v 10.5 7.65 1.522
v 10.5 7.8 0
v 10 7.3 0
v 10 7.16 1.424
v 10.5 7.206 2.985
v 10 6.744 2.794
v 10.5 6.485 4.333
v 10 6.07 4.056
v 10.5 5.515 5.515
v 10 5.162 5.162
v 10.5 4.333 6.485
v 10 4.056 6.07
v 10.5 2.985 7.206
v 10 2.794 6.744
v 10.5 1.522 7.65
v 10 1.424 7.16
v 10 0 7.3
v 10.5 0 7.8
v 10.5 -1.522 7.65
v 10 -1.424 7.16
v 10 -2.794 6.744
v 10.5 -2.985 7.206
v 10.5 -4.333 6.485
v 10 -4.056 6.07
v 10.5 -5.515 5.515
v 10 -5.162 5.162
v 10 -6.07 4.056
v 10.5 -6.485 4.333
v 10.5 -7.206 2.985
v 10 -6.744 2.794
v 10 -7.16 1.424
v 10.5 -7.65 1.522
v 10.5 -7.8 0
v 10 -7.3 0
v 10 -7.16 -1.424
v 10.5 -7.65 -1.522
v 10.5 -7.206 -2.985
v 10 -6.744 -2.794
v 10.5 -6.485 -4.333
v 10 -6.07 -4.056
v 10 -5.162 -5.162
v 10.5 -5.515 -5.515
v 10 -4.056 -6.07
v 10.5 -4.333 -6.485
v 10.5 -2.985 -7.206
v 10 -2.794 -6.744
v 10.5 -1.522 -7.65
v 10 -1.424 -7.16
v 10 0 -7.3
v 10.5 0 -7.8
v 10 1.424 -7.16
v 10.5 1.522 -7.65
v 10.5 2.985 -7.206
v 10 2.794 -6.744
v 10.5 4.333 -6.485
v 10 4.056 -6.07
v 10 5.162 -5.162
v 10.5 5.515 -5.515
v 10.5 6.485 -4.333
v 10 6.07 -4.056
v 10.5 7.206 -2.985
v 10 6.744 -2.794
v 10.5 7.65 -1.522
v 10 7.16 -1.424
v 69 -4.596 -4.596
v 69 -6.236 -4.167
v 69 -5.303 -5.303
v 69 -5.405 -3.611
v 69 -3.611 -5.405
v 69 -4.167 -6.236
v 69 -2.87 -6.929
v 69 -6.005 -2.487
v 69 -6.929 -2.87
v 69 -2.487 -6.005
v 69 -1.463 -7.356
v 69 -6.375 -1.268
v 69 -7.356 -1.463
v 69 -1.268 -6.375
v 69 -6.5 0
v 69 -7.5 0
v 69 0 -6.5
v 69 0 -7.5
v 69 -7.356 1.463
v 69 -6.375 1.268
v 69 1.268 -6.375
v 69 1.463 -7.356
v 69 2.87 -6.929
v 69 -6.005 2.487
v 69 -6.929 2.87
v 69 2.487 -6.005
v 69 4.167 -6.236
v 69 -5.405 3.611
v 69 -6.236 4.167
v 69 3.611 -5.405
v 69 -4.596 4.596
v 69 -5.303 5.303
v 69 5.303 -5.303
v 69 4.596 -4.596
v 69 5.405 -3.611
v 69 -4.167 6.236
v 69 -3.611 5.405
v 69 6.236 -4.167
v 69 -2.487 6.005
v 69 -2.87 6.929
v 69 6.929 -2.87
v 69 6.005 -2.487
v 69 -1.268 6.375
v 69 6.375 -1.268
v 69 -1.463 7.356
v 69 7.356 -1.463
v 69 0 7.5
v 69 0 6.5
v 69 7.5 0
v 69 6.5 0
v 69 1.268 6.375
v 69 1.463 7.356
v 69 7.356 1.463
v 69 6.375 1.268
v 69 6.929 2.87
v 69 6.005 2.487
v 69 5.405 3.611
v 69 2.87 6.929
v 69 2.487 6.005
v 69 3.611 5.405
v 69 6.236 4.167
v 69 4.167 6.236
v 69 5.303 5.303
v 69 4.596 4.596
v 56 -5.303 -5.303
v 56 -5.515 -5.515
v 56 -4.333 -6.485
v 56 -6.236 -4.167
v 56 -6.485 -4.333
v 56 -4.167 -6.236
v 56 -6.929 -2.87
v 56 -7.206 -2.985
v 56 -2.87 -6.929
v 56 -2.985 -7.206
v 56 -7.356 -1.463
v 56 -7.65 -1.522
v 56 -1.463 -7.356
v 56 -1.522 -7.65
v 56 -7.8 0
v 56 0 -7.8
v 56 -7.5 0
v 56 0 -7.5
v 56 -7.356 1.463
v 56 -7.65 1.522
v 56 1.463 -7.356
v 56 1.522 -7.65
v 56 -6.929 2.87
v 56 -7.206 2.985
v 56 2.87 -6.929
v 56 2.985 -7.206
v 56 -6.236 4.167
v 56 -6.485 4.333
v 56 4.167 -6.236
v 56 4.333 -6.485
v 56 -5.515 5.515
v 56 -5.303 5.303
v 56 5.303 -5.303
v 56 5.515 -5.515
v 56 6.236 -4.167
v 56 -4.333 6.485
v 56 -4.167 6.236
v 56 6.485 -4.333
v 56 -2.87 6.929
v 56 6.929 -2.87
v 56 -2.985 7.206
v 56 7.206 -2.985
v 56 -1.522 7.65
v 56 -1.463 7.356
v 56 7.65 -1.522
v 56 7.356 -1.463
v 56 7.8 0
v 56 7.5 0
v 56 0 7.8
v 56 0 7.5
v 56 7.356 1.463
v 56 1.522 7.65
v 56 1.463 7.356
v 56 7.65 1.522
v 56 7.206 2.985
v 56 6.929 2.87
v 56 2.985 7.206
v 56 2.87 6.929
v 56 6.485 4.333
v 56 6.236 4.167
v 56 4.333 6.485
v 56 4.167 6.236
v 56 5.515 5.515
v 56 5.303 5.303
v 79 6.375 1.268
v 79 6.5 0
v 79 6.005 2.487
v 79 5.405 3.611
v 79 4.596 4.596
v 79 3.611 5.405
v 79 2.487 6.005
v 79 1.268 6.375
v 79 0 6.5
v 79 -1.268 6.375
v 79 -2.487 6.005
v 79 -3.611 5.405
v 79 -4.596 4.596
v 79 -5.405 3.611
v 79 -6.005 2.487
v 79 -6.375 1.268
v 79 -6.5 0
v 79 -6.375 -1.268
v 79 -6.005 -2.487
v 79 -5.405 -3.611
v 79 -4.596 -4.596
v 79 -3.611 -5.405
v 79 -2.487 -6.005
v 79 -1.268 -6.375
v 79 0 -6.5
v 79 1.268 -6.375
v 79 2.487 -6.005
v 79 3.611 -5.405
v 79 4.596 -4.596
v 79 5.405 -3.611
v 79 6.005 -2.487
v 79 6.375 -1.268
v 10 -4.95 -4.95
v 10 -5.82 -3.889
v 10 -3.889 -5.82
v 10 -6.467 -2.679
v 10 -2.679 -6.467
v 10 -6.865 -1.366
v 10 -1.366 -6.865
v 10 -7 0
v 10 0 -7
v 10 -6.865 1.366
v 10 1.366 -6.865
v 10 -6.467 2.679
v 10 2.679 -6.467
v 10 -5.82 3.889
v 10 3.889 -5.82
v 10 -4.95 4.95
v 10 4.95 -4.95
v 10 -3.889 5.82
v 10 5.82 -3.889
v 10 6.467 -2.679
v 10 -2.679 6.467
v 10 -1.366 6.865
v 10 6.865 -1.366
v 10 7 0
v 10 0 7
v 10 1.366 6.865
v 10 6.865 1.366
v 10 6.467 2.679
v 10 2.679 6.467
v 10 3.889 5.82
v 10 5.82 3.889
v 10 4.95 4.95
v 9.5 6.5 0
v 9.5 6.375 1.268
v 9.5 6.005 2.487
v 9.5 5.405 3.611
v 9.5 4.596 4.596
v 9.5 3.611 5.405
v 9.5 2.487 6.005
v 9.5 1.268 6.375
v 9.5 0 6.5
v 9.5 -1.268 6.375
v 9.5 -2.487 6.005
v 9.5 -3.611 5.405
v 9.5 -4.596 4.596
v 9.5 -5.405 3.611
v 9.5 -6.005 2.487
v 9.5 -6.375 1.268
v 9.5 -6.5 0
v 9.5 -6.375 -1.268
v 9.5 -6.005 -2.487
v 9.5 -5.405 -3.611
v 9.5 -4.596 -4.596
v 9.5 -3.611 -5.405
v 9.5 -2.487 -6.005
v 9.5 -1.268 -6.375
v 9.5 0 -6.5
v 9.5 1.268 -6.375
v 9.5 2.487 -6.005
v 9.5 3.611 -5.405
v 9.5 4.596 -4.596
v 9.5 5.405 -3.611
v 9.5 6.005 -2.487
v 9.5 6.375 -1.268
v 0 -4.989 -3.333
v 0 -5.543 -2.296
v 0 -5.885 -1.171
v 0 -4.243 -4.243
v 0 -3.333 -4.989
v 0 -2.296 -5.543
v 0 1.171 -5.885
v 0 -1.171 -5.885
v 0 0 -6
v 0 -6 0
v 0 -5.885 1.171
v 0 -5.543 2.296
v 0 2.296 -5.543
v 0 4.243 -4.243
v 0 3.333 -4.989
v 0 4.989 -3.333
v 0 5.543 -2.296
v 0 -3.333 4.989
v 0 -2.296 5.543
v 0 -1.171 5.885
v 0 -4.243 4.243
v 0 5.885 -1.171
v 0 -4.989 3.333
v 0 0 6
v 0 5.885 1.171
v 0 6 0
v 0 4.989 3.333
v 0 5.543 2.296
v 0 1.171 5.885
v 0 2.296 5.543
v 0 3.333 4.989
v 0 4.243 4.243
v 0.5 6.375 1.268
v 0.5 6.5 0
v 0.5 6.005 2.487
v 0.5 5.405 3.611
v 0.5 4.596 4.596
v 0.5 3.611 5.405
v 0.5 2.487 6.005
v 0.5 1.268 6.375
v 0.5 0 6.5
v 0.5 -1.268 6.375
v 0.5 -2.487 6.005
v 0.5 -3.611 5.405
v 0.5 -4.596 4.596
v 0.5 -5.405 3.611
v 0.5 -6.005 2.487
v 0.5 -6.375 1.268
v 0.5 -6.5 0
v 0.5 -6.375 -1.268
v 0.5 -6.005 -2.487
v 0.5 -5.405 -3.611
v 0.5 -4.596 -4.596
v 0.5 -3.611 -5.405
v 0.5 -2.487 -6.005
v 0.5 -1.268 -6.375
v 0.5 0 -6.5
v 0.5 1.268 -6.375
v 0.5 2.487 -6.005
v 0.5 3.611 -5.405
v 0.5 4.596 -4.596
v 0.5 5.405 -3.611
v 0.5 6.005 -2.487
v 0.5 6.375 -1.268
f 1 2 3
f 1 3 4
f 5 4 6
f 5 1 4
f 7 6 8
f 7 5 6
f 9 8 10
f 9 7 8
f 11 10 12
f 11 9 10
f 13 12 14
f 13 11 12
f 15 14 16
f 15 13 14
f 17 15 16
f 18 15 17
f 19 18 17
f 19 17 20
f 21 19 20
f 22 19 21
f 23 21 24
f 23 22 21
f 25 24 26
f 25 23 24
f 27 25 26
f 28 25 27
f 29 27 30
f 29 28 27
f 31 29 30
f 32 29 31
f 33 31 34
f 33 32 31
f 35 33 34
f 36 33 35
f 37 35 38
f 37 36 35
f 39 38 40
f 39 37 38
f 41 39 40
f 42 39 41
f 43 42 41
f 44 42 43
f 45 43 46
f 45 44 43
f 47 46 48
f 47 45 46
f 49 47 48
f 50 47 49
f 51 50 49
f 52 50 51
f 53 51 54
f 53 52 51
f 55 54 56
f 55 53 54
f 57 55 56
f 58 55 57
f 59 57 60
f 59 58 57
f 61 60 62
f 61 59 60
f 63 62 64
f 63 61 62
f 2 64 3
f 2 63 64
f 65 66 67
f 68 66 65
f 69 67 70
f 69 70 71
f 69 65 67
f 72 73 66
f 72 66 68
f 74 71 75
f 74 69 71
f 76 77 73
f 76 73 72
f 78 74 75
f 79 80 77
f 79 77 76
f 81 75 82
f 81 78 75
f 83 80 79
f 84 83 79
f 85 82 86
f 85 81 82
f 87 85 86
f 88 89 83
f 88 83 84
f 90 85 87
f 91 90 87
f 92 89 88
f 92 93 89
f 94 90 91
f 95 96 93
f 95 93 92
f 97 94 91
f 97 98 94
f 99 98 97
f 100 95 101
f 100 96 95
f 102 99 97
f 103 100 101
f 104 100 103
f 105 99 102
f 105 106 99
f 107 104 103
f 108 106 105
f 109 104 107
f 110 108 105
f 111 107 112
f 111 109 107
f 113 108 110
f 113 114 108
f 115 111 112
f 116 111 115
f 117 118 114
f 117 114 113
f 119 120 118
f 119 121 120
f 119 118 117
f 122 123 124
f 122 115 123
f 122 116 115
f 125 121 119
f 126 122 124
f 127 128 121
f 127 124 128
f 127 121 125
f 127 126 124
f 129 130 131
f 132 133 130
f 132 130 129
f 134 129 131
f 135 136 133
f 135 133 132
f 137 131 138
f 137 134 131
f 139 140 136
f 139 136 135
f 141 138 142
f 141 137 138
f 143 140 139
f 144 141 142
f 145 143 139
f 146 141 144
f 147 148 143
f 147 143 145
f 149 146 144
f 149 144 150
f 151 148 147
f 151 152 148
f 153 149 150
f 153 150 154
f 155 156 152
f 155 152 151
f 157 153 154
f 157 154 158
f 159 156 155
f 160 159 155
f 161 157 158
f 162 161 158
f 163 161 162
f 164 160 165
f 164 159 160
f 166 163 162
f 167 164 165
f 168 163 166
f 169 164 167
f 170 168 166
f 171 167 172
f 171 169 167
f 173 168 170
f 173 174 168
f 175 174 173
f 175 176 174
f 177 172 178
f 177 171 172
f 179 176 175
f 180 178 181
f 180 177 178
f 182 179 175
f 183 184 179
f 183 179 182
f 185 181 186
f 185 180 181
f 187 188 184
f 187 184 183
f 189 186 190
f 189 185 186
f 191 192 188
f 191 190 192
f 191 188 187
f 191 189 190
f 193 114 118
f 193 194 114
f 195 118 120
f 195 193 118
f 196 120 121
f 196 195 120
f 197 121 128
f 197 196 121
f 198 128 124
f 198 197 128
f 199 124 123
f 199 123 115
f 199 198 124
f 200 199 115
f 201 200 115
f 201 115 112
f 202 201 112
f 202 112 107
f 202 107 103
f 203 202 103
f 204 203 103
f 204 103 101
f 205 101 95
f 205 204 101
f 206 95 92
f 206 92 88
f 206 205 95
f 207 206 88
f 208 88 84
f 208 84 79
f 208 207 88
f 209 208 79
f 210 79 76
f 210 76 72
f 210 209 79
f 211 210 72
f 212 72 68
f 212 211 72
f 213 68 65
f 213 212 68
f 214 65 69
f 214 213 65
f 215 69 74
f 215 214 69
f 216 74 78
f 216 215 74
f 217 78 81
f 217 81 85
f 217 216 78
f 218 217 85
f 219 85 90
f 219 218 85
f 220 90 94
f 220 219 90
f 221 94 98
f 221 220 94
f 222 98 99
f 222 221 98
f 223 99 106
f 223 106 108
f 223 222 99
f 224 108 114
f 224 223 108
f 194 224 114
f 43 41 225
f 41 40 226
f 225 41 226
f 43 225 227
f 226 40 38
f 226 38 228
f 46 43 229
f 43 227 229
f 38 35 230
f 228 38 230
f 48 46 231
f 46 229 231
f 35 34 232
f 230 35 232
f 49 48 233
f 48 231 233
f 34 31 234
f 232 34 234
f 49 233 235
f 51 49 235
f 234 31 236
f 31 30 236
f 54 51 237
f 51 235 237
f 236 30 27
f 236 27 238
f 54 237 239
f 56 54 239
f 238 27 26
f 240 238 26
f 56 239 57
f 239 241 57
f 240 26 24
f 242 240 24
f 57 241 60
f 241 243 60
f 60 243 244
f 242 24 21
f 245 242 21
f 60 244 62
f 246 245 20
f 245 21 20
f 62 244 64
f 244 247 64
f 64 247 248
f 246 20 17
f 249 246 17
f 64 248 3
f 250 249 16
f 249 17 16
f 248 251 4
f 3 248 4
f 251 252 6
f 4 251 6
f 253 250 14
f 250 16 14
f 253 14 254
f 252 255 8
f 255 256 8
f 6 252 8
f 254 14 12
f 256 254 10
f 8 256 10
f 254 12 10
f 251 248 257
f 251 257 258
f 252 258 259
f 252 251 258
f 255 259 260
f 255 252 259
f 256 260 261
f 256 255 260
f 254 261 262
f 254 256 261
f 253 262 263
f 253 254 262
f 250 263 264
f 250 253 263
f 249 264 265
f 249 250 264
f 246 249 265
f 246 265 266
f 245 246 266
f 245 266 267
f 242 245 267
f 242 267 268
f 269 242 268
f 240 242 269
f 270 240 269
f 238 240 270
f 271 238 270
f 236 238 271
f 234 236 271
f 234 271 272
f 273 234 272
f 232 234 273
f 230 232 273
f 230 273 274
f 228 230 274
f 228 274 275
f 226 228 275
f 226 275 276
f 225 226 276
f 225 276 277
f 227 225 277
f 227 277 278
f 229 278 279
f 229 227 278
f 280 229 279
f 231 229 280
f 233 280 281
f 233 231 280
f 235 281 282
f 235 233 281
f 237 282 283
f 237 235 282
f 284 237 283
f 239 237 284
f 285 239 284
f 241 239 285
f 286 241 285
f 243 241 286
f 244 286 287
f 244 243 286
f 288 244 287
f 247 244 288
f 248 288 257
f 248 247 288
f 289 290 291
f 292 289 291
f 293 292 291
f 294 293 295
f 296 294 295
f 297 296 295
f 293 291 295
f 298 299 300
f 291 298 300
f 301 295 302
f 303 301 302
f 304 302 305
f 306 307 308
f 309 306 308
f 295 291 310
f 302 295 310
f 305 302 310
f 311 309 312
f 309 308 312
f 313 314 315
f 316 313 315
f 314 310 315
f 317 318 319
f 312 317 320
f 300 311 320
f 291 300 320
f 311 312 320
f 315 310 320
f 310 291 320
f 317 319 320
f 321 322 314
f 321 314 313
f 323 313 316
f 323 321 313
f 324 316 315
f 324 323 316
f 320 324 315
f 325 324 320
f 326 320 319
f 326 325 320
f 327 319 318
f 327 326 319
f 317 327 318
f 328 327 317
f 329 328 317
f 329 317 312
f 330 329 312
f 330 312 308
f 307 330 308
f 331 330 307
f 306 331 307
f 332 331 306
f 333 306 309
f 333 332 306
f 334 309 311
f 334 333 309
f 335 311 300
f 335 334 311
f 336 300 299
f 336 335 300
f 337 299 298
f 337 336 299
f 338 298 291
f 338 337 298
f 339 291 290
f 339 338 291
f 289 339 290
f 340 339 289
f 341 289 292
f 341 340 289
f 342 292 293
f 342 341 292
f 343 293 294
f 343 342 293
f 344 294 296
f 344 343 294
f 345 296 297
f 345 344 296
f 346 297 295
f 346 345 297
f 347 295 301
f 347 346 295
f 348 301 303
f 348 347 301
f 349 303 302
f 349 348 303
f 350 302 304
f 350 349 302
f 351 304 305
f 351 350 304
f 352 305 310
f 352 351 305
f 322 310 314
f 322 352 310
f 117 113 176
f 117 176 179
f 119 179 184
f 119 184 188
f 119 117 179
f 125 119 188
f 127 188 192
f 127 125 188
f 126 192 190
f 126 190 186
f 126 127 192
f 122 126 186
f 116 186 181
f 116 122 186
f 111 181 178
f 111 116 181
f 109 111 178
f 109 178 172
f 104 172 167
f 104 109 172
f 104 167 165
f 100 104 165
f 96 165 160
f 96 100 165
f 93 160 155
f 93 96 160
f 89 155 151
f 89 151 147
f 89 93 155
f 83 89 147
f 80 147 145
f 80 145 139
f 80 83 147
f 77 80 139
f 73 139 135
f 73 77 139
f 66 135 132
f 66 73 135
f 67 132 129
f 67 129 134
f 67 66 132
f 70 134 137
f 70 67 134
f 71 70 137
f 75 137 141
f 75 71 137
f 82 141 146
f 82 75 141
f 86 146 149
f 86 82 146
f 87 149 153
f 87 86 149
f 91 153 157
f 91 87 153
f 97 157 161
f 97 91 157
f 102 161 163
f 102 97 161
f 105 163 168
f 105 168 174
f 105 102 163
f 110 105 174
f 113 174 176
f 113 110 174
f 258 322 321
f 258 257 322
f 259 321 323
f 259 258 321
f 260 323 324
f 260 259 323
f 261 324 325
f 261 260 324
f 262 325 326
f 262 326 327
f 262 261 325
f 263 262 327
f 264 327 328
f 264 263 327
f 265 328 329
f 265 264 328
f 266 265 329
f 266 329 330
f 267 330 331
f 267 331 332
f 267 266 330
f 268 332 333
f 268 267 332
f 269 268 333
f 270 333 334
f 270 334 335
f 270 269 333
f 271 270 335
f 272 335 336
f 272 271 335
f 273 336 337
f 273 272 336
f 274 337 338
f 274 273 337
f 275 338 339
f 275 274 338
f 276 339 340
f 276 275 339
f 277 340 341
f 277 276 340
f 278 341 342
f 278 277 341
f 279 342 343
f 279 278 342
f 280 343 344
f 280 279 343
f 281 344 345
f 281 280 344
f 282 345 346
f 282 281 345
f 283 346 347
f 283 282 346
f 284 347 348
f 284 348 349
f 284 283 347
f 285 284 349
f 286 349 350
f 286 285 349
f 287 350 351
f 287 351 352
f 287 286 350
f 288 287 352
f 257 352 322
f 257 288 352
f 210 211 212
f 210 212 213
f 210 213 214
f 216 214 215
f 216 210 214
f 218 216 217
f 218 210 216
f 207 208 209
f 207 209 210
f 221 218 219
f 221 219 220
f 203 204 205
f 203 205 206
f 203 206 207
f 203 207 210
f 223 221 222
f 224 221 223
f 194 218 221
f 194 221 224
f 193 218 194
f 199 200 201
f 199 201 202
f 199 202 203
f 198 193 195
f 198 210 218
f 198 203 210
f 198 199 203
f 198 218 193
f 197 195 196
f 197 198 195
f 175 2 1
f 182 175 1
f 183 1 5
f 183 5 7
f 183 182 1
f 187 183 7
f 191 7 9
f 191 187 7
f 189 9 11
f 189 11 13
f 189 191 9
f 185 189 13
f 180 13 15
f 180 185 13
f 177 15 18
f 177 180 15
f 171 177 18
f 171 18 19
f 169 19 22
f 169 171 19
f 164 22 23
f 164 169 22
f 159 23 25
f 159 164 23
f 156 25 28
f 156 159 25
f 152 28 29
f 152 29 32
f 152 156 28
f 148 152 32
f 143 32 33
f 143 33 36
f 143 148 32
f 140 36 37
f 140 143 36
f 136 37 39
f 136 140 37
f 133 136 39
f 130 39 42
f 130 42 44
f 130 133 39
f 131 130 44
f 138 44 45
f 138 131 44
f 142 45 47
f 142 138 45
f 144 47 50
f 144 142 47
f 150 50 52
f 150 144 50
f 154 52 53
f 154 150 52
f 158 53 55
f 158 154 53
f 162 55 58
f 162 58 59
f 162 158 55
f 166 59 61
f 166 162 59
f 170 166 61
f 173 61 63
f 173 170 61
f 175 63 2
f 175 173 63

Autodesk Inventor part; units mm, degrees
ref_plane "Start Plane" through (0, 0, 0) normal (1, 0, 0) x (0, 1, 0)
ref_plane "XZ Plane" through (0, 0, 0) normal (0, 1, 0) x (-1, 0, 0)
ref_plane "XY Plane" through (0, 0, 0) normal (0, 0, 1) x (1, 0, 0)
sketch "Main Sketch" plane through (0, 0, 0) normal (0, 0, 1) x (1, 0, 0)
  line L0 (0, 0) -> (79, 0)
  line L1 (0, 0) -> (0, 6.5)
  line L2 (0, 6.5) -> (10, 6.5)
  line L3 (10, 6.5) -> (10, 7.8)
  line L4 (56, 7.8) -> (56, 7.5)
  line L5 (10, 7.8) -> (56, 7.8)
  line L6 (69, 7.5) -> (69, 6.5)
  line L7 (56, 7.5) -> (69, 7.5)
  line L8 (79, 6.5) -> (79, 0)
  line L9 (69, 6.5) -> (79, 6.5)
  dimension "d3" = 13
  dimension "d4" = 15.6
  dimension "d5" = 15
  dimension "d6" = 13
revolve "Revolution1" add sketch "Main Sketch" angle 360 about axis through (0, 0, 0) along (1, 0, 0)
chamfer "Chamfer4" distance 0.5 angle 45 1 edges at (0, -6.5, 0) measured on face at (3.3333, 6.4158, -1.0427)
chamfer "Chamfer2" distance 0.5 angle 45 1 edges at (10, -6.5, 0) measured on face at (3.6667, 6.4789, -0.523)
chamfer "Chamfer3" distance 0.5 angle 45 1 edges at (10, -7.8, 0) measured on face at (25.3333, 7.699, -1.2512)
properties part number "Pedales - Eje" material "Steel"
